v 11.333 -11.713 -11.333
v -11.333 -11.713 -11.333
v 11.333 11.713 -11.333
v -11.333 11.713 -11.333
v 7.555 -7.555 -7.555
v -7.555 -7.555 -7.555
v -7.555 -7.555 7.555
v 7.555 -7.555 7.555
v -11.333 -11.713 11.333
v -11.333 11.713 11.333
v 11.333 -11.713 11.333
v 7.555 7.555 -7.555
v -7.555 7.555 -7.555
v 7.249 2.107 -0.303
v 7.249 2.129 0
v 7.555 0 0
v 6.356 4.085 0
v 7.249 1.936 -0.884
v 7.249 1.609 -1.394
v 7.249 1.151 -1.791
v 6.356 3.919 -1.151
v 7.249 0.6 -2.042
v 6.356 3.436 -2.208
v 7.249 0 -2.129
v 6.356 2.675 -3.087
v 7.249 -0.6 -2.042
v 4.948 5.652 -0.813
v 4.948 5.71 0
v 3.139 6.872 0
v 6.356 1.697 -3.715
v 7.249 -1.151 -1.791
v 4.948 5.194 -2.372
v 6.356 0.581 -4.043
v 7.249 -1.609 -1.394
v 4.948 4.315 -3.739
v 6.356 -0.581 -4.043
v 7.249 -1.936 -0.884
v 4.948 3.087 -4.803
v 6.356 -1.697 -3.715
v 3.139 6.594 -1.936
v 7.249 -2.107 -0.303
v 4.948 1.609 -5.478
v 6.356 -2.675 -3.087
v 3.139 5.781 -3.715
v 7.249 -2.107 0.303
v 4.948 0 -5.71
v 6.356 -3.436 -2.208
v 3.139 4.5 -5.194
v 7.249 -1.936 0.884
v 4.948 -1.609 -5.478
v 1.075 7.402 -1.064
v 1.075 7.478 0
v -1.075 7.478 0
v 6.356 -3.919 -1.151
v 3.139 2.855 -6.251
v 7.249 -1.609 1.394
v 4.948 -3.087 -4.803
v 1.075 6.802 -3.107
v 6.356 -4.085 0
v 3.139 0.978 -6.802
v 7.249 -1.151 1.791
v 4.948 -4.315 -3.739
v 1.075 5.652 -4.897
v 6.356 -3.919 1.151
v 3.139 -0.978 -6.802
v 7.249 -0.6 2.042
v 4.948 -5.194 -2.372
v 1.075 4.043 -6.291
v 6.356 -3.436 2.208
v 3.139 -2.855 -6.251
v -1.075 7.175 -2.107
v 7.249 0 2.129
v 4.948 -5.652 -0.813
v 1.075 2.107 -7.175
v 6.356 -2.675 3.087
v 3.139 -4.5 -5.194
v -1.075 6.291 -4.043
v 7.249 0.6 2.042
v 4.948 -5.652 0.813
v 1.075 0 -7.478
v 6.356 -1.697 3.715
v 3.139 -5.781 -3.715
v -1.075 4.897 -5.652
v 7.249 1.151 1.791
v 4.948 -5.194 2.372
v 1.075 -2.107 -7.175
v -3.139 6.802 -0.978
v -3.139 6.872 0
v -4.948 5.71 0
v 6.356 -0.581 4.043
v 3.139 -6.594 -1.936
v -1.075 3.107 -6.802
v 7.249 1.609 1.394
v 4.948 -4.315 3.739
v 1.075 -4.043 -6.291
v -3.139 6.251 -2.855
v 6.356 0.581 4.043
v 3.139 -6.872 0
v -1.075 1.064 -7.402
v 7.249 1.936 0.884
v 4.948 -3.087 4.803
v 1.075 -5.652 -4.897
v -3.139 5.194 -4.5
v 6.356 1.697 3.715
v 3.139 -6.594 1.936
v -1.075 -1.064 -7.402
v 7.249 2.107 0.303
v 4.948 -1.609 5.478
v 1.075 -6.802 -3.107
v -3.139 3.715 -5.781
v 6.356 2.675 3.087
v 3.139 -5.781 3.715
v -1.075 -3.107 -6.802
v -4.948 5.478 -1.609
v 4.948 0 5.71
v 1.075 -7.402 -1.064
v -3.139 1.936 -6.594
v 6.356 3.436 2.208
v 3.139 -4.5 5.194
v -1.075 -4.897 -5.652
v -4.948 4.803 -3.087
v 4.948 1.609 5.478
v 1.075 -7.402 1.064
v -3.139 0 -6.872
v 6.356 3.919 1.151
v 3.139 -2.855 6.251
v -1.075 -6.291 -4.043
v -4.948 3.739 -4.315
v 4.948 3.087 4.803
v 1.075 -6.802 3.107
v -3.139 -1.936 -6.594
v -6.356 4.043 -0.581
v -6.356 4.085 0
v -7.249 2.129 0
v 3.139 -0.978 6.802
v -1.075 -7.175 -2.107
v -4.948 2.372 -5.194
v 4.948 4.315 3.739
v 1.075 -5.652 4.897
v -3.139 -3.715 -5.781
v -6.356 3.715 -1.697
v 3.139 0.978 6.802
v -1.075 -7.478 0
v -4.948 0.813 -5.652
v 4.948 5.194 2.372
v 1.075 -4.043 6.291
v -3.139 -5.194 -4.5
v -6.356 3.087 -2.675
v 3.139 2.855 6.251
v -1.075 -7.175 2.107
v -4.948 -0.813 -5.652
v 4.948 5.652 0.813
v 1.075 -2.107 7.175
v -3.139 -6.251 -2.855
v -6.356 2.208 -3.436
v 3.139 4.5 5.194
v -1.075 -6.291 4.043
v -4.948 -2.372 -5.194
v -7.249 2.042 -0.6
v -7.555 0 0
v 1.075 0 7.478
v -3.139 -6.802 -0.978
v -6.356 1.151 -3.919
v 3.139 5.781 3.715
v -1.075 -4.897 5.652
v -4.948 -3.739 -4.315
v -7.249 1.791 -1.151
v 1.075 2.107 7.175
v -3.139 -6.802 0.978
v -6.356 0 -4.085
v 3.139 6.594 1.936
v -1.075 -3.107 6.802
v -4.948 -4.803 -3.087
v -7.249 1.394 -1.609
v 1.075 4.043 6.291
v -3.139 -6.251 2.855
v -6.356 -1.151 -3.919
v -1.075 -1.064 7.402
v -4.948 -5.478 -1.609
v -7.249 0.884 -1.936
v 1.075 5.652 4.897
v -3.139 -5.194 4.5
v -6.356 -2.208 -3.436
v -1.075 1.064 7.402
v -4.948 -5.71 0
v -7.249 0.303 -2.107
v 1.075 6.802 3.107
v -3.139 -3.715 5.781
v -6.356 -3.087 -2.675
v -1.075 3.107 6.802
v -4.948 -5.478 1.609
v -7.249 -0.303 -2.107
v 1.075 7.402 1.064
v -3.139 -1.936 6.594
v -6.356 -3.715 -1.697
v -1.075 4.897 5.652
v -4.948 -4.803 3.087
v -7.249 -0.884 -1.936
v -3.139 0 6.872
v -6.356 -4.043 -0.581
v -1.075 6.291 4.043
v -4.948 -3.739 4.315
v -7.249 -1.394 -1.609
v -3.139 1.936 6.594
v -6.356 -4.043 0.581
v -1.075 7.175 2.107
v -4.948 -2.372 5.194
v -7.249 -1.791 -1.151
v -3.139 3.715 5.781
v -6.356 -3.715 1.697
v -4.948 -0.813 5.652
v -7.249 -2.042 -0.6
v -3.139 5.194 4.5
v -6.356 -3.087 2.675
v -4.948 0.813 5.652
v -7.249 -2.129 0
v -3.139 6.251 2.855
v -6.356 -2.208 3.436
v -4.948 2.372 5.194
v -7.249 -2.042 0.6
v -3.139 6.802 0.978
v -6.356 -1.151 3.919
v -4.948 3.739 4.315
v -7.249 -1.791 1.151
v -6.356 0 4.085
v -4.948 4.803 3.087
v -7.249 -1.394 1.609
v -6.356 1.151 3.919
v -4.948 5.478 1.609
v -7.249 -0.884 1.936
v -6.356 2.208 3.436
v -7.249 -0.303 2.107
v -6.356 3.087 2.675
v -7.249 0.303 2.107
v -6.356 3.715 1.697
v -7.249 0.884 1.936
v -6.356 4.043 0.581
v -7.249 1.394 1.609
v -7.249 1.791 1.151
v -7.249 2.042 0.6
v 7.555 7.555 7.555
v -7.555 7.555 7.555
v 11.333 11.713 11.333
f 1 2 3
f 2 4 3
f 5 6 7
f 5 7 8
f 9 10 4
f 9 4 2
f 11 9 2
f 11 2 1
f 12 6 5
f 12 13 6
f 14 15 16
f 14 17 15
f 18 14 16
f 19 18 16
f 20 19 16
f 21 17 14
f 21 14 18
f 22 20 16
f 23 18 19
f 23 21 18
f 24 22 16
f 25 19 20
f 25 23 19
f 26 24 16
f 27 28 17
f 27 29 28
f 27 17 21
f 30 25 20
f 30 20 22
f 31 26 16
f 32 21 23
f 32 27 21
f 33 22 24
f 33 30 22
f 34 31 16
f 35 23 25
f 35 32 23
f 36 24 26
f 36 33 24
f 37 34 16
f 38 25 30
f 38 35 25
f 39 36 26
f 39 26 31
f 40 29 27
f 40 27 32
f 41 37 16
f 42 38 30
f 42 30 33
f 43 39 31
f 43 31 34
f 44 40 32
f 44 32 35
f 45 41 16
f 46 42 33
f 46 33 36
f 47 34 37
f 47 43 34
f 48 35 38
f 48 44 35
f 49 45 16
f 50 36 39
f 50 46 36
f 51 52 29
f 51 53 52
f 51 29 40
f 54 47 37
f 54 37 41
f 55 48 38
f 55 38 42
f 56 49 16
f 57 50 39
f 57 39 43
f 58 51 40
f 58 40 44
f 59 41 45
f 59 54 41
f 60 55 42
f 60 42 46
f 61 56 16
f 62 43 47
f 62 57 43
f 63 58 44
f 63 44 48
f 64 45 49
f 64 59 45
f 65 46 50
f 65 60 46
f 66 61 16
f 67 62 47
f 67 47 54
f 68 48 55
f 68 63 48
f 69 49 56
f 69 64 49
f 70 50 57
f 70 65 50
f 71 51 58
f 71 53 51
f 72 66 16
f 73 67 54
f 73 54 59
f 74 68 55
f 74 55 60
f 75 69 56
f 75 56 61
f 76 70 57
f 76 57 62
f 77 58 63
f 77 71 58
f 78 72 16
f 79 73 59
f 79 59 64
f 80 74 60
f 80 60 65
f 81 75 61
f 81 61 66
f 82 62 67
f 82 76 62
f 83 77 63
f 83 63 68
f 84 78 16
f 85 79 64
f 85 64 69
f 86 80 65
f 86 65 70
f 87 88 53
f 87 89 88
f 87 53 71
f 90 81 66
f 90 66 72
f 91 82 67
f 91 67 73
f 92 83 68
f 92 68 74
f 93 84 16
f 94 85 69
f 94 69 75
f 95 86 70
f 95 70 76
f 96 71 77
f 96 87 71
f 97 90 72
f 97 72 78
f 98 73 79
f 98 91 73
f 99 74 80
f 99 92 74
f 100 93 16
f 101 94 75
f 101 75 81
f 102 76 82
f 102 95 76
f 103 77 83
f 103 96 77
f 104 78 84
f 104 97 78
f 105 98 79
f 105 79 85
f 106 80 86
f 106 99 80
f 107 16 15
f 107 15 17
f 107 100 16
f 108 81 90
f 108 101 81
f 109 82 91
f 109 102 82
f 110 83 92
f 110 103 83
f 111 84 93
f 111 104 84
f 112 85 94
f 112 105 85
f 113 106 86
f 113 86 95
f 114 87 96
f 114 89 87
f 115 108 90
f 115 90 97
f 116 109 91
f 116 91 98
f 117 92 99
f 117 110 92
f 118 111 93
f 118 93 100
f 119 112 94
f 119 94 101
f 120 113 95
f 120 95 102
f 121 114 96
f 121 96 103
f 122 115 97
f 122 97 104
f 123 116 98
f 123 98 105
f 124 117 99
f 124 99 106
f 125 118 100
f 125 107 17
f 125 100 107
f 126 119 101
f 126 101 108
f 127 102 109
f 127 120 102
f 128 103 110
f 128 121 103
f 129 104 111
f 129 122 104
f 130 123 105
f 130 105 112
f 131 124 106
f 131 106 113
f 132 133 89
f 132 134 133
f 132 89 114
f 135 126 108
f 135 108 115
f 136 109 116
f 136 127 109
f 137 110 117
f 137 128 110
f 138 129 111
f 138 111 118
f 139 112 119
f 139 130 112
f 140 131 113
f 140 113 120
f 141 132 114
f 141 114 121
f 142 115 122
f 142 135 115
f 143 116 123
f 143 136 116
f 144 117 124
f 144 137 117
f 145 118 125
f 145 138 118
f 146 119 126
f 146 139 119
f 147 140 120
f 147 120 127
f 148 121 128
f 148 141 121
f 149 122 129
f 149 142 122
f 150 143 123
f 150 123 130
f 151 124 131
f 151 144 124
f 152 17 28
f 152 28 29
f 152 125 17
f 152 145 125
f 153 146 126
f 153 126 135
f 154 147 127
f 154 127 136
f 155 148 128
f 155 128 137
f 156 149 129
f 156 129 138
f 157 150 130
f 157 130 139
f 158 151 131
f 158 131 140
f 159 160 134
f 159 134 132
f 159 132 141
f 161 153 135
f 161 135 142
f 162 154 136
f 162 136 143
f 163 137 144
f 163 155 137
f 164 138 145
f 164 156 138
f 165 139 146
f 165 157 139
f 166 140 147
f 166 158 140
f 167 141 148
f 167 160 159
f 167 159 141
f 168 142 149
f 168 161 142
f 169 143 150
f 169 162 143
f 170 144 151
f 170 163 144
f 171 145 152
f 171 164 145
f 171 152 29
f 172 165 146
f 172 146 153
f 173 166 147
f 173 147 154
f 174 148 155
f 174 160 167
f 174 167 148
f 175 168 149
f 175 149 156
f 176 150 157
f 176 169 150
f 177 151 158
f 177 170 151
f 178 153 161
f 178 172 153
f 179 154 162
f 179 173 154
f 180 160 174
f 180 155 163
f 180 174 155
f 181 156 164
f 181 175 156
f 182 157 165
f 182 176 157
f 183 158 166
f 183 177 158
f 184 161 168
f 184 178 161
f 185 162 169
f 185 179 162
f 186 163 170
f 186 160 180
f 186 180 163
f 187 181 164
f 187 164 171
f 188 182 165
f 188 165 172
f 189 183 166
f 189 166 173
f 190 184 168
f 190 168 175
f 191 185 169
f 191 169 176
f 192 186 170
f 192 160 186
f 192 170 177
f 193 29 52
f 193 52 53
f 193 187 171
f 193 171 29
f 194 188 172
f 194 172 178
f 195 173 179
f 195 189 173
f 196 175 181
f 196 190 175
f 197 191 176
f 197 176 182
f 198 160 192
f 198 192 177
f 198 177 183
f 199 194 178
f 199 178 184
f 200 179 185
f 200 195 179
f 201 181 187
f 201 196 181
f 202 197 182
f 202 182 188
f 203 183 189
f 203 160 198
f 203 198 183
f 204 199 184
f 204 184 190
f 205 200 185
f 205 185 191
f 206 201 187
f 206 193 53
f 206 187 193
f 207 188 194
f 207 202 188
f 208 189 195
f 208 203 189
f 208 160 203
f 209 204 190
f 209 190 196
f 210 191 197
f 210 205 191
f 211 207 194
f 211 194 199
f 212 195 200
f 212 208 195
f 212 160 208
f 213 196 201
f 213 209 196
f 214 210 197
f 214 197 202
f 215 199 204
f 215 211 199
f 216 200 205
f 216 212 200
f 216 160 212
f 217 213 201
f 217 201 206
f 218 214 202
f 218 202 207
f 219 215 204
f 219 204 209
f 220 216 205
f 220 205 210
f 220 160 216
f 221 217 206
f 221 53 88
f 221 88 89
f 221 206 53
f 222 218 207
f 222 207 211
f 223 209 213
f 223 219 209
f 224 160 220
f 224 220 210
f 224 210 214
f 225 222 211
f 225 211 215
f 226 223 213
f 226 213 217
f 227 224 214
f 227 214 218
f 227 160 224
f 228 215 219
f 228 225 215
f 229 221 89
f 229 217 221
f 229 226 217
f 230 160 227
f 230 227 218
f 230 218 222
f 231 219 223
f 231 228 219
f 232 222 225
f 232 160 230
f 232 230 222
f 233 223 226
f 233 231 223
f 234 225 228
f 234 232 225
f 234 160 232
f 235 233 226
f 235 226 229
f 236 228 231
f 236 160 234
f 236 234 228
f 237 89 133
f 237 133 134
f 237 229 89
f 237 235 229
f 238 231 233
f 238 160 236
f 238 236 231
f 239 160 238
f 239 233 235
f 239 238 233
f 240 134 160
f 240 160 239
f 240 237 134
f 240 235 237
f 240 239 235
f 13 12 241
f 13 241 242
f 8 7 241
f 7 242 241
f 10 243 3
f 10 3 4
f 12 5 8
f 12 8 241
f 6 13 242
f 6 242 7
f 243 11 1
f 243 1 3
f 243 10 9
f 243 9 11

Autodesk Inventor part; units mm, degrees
ref_plane "YZ Plane" through (0, 0, 0) normal (1, 0, 0) x (0, 1, 0)
ref_plane "XZ Plane" through (0, 0, 0) normal (0, 1, 0) x (-1, 0, 0)
ref_plane "XY Plane" through (0, 0, 0) normal (0, 0, 1) x (1, 0, 0)
sketch "Náčrt1" plane through (0, 0, 0) normal (0, 0, 1) x (1, 0, 0)
  circle A0 centre (0, 0) radius 7.5551
  line L0 (-7.5551, -7.5551) -> (7.5551, -7.5551)
  line L1 (7.5551, -7.5551) -> (7.5551, 7.5551)
  line L2 (7.5551, 7.5551) -> (-7.5551, 7.5551)
  line L3 (-7.5551, 7.5551) -> (-7.5551, -7.5551)
  line L4 (-7.5551, -7.5551) -> (7.5551, 7.5551) construction
  line L5 (7.5551, -7.5551) -> (-7.5551, 7.5551) construction
  line L6 (-11.3327, -11.713) -> (11.3327, -11.713)
  line L7 (11.3327, -11.713) -> (11.3327, 11.713)
  line L8 (11.3327, 11.713) -> (-11.3327, 11.713)
  line L9 (-11.3327, 11.713) -> (-11.3327, -11.713)
  line L10 (-11.3327, -11.713) -> (11.3327, 11.713) construction
  line L11 (11.3327, -11.713) -> (-11.3327, 11.713) construction
  line L12 (-7.5551, 0) -> (7.5551, 0)
  dimension "d1" = 15.1102
  dimension "d2" = 22.6653
extrude "Vysunutí1" add sketch "Náčrt1" along normal mid plane 22.6653 contours L12 A0 | L1 L0 A0 | A0 L2 L1 | A0 L12 | A0 L3 L2 | L0 L3 A0 | L9 L8 L7 L6
extrude "Vysunutí2" cut sketch "Náčrt1" along normal mid plane 15.1102 contours L12 A0 | L1 L0 A0 | A0 L2 L1 | A0 L12 | A0 L3 L2 | L0 L3 A0
revolve "Rotace1" add sketch "Náčrt1" angle 360 about axis through (-7.5551, 0, 0) along (1, 0, 0) picked at (1.9689, 1.5702) contours L12 A0
equation "\"d1\" = PRUMER"
equation "\"d2\" = HRANA"
equation "\"d3\" = HRANA"
equation "\"d5\" = PRUMER"
equation "\"PRUMER\" = 15.11021"
equation "\"HRANA\" = 1.5 * PRUMER"
properties part number "parametry"
